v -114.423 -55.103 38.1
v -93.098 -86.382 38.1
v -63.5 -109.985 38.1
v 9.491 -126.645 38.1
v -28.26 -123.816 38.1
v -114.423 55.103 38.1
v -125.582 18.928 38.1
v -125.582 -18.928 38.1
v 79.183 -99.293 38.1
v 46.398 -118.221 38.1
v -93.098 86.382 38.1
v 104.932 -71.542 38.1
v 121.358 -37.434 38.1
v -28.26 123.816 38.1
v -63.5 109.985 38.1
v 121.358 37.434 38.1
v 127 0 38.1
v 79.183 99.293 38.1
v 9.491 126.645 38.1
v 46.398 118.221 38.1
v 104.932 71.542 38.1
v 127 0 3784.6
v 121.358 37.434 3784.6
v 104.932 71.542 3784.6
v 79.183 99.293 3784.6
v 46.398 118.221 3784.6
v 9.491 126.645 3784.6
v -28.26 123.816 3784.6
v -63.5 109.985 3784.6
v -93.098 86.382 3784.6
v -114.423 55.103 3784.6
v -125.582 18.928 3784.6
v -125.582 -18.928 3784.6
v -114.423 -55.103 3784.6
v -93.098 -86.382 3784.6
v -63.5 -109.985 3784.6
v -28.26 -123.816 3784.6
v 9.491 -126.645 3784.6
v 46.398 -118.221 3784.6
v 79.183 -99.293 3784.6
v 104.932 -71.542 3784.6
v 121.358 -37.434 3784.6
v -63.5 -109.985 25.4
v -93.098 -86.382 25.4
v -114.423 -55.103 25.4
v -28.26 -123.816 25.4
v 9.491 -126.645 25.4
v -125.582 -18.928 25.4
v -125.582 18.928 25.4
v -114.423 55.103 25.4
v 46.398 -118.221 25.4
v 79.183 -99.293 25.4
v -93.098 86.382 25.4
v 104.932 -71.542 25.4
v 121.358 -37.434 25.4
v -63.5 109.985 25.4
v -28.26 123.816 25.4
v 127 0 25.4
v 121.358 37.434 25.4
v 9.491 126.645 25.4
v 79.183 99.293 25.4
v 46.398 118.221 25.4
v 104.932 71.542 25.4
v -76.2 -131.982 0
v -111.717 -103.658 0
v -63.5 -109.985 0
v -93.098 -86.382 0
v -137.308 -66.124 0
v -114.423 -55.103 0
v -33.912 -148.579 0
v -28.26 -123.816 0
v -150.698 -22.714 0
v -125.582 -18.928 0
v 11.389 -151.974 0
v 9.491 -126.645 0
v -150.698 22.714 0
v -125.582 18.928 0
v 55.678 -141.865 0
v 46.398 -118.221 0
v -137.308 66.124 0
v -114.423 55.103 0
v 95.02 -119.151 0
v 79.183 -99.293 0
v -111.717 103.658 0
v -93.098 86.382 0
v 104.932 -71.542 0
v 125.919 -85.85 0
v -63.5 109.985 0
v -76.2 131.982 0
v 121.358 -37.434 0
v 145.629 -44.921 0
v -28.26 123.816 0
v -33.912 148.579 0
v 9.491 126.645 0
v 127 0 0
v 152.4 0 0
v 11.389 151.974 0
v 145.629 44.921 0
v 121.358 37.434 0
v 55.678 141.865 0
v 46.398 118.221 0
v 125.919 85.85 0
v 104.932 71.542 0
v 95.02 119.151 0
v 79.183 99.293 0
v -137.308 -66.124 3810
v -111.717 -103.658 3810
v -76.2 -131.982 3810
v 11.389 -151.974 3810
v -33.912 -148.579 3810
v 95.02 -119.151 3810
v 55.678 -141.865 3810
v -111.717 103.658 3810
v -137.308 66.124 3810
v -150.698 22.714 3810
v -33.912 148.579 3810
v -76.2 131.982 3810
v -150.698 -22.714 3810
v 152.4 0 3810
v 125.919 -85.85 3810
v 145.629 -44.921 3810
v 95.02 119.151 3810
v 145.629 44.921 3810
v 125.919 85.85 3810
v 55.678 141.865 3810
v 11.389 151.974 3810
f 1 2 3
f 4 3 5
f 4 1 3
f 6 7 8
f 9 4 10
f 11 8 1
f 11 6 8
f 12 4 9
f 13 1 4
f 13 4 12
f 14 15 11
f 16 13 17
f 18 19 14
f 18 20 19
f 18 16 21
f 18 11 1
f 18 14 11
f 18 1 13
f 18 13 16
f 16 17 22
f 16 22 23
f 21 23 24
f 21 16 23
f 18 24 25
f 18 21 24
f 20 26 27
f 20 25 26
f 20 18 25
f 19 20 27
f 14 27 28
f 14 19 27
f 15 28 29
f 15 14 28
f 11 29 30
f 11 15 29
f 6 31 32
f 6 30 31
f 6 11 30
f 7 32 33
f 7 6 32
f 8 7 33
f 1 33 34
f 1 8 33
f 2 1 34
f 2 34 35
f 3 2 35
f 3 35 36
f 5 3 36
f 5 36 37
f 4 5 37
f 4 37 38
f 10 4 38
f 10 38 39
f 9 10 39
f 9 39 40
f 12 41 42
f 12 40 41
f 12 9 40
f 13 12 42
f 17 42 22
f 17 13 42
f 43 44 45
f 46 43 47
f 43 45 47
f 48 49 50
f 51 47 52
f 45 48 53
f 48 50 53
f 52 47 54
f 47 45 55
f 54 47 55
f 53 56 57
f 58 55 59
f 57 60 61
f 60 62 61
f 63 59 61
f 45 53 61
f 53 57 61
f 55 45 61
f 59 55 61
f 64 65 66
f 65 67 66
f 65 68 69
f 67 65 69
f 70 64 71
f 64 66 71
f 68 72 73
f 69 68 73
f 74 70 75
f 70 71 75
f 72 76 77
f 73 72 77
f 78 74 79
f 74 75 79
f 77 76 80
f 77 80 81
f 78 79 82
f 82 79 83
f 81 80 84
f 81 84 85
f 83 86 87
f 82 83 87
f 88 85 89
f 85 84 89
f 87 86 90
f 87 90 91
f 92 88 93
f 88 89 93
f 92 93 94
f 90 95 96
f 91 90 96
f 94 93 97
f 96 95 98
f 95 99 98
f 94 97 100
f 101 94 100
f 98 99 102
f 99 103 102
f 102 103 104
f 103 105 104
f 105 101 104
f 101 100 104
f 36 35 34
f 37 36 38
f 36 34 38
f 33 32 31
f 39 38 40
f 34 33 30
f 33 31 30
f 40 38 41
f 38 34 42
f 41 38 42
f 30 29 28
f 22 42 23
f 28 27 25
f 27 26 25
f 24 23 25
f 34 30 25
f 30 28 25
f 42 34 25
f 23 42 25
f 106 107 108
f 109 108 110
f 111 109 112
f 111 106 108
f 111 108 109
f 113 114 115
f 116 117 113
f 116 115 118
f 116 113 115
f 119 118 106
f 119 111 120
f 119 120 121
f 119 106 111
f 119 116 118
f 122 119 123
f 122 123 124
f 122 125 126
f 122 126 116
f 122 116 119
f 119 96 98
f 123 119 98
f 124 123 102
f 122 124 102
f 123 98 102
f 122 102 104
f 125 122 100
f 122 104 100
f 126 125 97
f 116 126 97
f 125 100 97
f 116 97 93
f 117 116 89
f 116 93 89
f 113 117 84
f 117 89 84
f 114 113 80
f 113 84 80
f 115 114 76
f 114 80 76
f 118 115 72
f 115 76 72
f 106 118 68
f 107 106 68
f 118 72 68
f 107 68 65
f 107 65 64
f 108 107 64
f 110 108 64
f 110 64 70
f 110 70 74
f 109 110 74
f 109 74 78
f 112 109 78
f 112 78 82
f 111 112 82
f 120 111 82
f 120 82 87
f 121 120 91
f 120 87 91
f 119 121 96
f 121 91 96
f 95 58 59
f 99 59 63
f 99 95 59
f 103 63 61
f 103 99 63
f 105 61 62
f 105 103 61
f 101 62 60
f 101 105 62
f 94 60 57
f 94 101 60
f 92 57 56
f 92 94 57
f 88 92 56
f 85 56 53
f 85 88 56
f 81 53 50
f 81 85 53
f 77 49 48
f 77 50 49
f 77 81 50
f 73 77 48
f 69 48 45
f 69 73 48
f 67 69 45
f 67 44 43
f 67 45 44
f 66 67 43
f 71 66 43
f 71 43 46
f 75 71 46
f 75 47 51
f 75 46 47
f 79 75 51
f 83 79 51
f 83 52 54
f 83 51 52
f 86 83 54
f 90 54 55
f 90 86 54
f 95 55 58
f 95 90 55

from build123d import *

# Parameters (mm, degrees)
F0_R     = 152.4
F1_DEPTH = 3810
F2_T     = -25.4
F4_R     = 142.288685
F5_DEPTH = 12.7


with BuildPart() as f1:
    # F0 (on Top) → F1 (new body)
    with BuildSketch(Plane.XY):
        Circle(F0_R)
    extrude(amount=F1_DEPTH)

    # F2
    f2_openings = [f1.faces().sort_by_distance(p)[0] for p in [
        (0, 0, 0),
    ]]
    offset(amount=F2_T, openings=f2_openings)

    # F4 (on offset) → F5 (join)
    with BuildSketch(Plane.XY.offset(25.4)):
        Circle(F4_R)
    extrude(amount=F5_DEPTH)


solid = f1.part
